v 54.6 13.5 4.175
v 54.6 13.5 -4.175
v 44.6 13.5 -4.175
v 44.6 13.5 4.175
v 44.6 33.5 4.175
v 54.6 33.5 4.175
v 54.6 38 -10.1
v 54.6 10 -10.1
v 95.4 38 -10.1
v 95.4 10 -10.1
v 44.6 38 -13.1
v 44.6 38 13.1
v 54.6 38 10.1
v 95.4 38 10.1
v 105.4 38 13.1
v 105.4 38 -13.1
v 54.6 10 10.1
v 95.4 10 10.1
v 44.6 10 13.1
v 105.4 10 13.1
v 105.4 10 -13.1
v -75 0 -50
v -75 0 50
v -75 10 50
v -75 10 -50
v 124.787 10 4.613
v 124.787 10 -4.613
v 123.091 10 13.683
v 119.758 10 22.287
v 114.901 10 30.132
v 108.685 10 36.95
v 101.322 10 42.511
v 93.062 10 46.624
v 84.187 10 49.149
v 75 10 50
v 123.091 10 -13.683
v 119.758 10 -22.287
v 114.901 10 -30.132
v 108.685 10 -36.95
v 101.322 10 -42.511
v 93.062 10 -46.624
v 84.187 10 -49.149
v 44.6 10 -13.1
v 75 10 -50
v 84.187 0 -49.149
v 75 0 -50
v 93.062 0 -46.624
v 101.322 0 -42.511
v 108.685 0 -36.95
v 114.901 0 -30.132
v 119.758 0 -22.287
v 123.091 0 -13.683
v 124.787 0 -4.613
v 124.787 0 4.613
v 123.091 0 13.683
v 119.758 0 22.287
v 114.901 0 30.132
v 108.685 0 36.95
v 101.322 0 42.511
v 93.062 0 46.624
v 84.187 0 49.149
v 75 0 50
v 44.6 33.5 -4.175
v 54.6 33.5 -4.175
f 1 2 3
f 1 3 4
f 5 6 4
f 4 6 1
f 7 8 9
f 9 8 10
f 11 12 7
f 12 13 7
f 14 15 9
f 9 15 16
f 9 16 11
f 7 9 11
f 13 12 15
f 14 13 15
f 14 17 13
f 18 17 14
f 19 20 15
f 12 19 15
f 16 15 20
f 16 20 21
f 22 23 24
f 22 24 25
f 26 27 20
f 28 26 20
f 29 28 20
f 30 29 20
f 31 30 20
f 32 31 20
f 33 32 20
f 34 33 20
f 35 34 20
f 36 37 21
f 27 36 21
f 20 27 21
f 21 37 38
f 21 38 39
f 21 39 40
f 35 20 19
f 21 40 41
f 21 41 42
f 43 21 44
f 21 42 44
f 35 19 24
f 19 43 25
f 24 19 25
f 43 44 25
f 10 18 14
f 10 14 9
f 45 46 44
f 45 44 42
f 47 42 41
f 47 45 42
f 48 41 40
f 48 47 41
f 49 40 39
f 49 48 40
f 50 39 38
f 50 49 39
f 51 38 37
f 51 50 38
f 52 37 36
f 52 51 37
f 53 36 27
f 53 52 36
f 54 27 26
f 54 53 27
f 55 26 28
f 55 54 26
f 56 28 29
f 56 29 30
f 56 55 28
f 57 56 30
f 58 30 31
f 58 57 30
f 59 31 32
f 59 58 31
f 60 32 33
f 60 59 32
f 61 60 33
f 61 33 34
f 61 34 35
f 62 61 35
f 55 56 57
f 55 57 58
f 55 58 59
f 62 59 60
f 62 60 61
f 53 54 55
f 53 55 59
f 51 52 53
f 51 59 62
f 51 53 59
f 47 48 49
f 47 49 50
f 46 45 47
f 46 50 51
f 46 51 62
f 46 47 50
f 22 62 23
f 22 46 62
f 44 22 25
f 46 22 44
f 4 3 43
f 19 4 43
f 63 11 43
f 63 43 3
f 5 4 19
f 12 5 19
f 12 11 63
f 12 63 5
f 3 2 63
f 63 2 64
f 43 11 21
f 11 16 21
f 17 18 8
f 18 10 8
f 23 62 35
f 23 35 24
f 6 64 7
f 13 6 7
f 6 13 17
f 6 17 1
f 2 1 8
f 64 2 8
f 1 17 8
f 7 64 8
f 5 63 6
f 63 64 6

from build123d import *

# Parameters (mm, degrees)
BOSS_EXTRUDE4_DEPTH = 10
SKETCH6_W           = 46.8
SKETCH6_H           = 26.2
SKETCH6_W_2         = 40.8
SKETCH6_H_2         = 20.2
BOSS_EXTRUDE5_DEPTH = 28
SKETCH8_W           = 8.35
SKETCH8_H           = 20
CUT_EXTRUDE2_DEPTH  = 28
SKETCH12_W          = 26.2
SKETCH12_H          = 28
BOSS_EXTRUDE6_DEPTH = 7
SKETCH13_W          = 8.35
SKETCH13_H          = 4.5
SKETCH13_H_2        = 3.5
BOSS_EXTRUDE7_DEPTH = 7


with BuildPart() as part:
    # Sketch2 → Boss-Extrude4 (new body)
    with BuildSketch(Plane(origin=(0, 0, 0), x_dir=(1, 0, 0), z_dir=(0, 1, 0))):
        with BuildLine():
            Line((-74.999999302, 50.000000465), (75.000000698, 50.000000465))
            ThreePointArc((75.000000698, 50.000000465), (124.999999302, -9.31e-07), (74.999997905, -49.999999535))
            Line((74.999997905, -49.999999535), (-74.999999302, -49.999999535))
            Line((-74.999999302, -49.999999535), (-74.999999302, 50.000000465))
        make_face()
    extrude(amount=BOSS_EXTRUDE4_DEPTH)

    # Sketch6 → Boss-Extrude5 (add)
    with BuildSketch(Plane(origin=(0, 10, 0), x_dir=(1, 0, 0), z_dir=(0, 1, 0))):
        with Locations((74.999999302, 4.65e-07)):
            Rectangle(SKETCH6_W, SKETCH6_H)
        with Locations((74.999999302, 4.65e-07)):
            Rectangle(SKETCH6_W_2, SKETCH6_H_2, mode=Mode.SUBTRACT)
    extrude(amount=BOSS_EXTRUDE5_DEPTH)

    # Sketch8 → Cut-Extrude2 (cut)
    with BuildSketch(Plane.ZY.offset(-51.599999302)):
        with Locations((-4.65e-07, 23.5)):
            Rectangle(SKETCH8_W, SKETCH8_H)
    extrude(amount=-CUT_EXTRUDE2_DEPTH, mode=Mode.SUBTRACT)

    # Sketch12 → Boss-Extrude6 (add)
    with BuildSketch(Plane(origin=(98.399999302, 0, 0), x_dir=(0, 0, -1), z_dir=(1, 0, 0))):
        with Locations((4.65e-07, 24)):
            Rectangle(SKETCH12_W, SKETCH12_H)
    extrude(amount=BOSS_EXTRUDE6_DEPTH)

    # Sketch13 → Boss-Extrude7 (add)
    with BuildSketch(Plane.ZY.offset(-51.599999302)):
        Polygon((-4.175000465, 10), (-4.175000465, 13.5), (-4.175000465, 33.5), (-4.175000465, 38), (-13.100000465, 38), (-13.100000465, 10), align=None)
        with Locations((-4.65e-07, 35.75)):
            Rectangle(SKETCH13_W, SKETCH13_H)
        Polygon((4.174999535, 33.5), (4.174999535, 13.5), (4.174999535, 10), (13.099999535, 10), (13.099999535, 38), (4.174999535, 38), align=None)
        with Locations((-4.65e-07, 11.75)):
            Rectangle(SKETCH13_W, SKETCH13_H_2)
    extrude(amount=BOSS_EXTRUDE7_DEPTH)


solid = part.part
